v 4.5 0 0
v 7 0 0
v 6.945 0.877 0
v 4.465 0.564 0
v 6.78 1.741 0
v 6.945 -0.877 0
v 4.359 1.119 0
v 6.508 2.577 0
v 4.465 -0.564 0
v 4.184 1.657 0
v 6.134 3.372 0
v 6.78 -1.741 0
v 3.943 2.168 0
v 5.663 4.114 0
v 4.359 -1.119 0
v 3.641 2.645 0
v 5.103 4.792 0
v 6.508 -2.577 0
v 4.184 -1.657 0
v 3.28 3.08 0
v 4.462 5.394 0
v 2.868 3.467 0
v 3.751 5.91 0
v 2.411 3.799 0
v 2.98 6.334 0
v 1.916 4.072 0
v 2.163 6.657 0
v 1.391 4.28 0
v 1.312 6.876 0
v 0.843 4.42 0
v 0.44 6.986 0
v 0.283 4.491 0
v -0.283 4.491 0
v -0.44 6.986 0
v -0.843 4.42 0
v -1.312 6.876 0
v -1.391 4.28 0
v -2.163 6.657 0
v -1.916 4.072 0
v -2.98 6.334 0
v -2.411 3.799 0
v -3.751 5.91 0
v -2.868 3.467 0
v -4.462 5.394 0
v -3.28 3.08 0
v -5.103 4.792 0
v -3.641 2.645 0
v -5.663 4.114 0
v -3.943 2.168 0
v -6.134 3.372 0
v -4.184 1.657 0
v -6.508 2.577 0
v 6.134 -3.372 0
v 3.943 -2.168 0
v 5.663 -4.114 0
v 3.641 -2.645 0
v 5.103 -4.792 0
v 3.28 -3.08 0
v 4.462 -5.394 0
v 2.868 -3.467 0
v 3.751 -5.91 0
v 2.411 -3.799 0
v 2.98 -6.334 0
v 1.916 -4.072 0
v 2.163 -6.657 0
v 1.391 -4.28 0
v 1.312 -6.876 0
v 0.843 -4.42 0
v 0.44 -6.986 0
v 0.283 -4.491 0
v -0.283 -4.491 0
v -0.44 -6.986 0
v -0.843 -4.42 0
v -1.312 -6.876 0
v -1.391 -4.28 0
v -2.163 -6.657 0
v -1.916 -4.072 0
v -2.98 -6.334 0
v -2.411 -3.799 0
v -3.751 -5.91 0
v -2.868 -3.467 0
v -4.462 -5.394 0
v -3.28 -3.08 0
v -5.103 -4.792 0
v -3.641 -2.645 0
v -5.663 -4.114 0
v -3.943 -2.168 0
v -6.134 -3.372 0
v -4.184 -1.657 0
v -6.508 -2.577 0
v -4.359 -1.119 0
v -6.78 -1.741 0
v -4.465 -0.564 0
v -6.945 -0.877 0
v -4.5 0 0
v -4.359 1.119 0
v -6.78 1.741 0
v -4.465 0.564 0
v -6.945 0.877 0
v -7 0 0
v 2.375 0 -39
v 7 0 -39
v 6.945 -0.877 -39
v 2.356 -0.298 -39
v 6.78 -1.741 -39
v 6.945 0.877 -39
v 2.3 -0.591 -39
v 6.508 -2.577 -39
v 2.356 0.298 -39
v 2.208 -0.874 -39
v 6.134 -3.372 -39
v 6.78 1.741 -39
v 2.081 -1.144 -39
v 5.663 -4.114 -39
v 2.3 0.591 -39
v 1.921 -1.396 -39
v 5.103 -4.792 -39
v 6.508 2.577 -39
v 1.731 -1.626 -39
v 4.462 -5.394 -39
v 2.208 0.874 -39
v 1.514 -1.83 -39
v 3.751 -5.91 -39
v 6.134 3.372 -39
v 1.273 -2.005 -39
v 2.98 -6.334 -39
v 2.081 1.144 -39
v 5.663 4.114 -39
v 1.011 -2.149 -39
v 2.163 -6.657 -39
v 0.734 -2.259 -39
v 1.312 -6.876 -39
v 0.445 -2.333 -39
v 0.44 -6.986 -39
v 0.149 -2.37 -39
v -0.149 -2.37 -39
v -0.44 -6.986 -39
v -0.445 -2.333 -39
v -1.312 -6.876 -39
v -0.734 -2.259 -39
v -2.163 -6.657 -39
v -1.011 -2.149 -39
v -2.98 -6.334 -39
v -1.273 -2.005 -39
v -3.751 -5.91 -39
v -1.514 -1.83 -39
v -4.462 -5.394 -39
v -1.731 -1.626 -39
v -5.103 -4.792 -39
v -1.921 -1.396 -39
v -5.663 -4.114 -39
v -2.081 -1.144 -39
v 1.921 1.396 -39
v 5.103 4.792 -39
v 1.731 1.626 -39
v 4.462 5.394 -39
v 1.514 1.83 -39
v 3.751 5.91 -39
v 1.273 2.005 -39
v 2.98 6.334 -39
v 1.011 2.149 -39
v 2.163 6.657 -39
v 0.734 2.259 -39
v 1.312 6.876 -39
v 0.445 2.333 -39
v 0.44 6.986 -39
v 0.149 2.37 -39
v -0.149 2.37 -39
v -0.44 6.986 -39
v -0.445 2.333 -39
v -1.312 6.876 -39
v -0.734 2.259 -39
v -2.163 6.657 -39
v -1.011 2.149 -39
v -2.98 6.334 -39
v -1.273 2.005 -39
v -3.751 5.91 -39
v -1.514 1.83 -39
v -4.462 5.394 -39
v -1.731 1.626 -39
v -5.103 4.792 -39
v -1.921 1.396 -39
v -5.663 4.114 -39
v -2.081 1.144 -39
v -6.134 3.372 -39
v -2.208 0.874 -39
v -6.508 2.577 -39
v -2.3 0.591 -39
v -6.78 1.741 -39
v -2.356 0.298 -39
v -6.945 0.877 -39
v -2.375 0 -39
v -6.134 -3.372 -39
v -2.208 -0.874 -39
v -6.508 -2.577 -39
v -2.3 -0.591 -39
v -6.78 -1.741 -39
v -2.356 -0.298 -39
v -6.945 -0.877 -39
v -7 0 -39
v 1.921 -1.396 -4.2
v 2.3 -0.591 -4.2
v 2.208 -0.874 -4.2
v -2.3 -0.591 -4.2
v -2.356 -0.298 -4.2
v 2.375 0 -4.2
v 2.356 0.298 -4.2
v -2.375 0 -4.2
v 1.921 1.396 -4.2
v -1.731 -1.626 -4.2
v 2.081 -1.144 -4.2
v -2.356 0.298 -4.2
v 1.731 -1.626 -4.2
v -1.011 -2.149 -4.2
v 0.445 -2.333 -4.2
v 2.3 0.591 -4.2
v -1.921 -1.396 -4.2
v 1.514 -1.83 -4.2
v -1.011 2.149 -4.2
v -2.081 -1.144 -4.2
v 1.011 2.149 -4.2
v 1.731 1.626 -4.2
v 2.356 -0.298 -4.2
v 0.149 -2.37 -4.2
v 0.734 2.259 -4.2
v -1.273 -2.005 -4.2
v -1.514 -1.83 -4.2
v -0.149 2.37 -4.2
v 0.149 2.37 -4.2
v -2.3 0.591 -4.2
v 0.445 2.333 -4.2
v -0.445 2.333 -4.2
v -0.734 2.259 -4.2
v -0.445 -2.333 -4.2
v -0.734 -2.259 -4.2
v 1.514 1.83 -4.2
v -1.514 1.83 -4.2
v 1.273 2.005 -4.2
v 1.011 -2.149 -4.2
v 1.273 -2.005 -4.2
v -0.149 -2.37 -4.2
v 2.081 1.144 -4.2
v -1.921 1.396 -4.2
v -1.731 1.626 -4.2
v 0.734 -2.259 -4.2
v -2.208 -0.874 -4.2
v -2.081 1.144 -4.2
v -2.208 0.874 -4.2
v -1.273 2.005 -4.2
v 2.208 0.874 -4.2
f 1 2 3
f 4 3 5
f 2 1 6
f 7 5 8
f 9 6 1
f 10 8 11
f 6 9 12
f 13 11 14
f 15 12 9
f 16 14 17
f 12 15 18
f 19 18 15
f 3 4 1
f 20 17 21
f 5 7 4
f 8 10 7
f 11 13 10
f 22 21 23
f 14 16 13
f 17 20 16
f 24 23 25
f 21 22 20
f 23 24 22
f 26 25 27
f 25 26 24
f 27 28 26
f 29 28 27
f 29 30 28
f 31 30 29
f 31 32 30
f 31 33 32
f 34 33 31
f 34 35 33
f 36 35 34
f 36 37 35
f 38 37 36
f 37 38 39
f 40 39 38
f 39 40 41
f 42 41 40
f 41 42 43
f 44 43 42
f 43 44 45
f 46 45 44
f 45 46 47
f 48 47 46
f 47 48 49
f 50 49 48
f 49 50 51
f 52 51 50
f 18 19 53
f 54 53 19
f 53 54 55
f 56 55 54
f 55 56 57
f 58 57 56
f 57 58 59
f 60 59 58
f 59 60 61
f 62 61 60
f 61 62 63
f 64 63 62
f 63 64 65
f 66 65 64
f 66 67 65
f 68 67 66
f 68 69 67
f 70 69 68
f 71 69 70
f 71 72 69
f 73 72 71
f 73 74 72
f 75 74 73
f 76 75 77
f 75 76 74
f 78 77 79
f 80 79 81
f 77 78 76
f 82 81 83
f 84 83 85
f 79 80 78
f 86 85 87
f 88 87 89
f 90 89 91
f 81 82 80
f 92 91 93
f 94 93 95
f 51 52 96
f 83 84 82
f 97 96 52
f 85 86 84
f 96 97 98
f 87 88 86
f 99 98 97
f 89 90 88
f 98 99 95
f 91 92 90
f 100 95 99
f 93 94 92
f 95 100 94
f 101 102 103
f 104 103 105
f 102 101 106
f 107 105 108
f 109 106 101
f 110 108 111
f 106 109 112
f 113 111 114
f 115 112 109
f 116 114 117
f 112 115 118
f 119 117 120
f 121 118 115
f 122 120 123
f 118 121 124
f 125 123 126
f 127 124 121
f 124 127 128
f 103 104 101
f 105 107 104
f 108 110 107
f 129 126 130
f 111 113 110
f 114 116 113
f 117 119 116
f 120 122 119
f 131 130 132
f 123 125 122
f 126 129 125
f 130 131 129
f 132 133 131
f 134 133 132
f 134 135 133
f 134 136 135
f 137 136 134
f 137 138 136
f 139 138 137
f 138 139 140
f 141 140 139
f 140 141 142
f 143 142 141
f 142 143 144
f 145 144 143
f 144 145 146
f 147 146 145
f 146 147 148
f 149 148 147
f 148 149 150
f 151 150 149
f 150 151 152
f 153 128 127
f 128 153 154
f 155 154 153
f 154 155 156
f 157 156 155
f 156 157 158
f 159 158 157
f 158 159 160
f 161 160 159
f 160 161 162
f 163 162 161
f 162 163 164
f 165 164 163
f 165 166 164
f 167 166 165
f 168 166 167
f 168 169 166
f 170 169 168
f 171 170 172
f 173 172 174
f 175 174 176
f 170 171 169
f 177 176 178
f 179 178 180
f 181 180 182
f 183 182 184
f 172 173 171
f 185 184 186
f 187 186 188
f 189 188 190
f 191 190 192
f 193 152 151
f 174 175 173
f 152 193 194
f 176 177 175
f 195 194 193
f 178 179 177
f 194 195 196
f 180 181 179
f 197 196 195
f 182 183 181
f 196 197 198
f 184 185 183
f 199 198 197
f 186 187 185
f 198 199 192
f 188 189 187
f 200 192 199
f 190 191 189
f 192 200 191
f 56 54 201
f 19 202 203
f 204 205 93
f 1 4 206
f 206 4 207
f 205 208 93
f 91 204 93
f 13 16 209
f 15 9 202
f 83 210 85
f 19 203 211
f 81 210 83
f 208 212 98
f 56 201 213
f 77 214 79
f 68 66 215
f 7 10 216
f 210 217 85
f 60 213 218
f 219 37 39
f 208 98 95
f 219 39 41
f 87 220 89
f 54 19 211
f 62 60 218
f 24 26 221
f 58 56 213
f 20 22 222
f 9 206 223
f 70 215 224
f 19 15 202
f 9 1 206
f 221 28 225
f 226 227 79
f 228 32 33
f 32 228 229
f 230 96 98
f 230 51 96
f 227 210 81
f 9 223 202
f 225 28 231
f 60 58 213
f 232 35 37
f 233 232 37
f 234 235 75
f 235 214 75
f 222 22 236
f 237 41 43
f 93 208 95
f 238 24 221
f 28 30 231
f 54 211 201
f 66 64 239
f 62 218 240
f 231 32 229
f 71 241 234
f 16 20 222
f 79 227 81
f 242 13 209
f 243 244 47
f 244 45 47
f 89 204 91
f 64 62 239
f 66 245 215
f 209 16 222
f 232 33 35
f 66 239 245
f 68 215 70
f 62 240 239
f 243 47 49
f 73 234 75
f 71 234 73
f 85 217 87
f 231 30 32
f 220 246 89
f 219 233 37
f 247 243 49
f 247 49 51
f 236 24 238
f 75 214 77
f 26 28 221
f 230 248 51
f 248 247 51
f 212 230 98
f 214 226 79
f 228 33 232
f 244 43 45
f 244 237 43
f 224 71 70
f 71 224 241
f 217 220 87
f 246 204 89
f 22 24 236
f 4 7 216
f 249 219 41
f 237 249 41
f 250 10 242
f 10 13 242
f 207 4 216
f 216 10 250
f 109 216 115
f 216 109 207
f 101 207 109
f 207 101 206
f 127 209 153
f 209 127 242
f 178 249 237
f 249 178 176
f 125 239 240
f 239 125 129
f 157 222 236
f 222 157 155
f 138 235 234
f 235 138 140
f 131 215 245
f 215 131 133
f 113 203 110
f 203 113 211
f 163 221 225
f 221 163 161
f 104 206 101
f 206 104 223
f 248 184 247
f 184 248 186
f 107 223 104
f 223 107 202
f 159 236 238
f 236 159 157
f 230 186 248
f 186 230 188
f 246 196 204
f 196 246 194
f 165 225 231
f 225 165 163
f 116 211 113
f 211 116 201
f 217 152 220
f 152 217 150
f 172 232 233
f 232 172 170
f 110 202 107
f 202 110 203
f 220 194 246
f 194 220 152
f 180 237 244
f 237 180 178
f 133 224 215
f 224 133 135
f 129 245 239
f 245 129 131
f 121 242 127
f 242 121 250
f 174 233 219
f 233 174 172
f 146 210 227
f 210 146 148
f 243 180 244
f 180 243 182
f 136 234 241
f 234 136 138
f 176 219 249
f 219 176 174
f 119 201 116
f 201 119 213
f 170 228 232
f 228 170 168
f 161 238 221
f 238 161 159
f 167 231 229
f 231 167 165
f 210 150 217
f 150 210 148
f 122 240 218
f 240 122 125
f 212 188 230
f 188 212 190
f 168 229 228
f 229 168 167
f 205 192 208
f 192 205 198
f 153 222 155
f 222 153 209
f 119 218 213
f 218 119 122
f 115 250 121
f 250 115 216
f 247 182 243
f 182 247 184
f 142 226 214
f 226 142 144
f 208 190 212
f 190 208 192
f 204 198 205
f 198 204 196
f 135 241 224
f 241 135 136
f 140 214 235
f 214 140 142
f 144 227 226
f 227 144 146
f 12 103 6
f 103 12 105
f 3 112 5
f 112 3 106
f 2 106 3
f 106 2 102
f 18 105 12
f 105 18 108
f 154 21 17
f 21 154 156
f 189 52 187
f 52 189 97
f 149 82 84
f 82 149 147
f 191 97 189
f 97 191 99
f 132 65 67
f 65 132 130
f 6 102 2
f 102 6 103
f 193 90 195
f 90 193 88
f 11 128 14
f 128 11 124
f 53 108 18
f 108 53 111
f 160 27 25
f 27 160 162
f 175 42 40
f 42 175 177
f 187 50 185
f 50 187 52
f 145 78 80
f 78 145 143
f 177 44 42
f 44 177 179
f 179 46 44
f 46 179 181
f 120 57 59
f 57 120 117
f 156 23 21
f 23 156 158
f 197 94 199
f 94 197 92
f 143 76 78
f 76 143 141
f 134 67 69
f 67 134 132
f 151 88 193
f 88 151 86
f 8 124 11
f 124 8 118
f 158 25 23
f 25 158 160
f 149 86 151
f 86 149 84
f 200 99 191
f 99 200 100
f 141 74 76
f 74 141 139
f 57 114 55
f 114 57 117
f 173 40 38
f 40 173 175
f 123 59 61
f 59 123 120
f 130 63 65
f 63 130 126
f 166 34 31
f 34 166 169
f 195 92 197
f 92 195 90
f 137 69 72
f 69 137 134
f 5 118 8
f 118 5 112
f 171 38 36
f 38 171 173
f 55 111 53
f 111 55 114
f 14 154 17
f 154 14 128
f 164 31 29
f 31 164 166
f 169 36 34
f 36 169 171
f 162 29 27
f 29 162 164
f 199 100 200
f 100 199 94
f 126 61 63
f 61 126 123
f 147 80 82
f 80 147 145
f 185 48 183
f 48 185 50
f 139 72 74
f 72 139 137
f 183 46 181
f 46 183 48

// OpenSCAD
$fn = 50;


difference() {
	union() {
		translate(v = [0, 0, -39.0000000000]) {
			cylinder(h = 39, r = 7.0000000000);
		}
		cylinder(h = 0, r = 17.0000000000);
	}
	union() {
		translate(v = [0, 0, 0]) {
			rotate(a = [0, 0, 0]) {
				difference() {
					union() {
						#translate(v = [0, 0, -39.0000000000]) {
							cylinder(h = 39, r = 2.2500000000);
						}
						#translate(v = [0, 0, -4.2000000000]) {
							cylinder(h = 4.2000000000, r = 7.0000000000, r1 = 2.3750000000, r2 = 4.5000000000);
						}
						#translate(v = [0, 0, -39.0000000000]) {
							cylinder(h = 39, r = 2.3750000000);
						}
						#translate(v = [0, 0, -39.0000000000]) {
							cylinder(h = 39, r = 2.2500000000);
						}
					}
					union();
				}
			}
		}
	}
}
